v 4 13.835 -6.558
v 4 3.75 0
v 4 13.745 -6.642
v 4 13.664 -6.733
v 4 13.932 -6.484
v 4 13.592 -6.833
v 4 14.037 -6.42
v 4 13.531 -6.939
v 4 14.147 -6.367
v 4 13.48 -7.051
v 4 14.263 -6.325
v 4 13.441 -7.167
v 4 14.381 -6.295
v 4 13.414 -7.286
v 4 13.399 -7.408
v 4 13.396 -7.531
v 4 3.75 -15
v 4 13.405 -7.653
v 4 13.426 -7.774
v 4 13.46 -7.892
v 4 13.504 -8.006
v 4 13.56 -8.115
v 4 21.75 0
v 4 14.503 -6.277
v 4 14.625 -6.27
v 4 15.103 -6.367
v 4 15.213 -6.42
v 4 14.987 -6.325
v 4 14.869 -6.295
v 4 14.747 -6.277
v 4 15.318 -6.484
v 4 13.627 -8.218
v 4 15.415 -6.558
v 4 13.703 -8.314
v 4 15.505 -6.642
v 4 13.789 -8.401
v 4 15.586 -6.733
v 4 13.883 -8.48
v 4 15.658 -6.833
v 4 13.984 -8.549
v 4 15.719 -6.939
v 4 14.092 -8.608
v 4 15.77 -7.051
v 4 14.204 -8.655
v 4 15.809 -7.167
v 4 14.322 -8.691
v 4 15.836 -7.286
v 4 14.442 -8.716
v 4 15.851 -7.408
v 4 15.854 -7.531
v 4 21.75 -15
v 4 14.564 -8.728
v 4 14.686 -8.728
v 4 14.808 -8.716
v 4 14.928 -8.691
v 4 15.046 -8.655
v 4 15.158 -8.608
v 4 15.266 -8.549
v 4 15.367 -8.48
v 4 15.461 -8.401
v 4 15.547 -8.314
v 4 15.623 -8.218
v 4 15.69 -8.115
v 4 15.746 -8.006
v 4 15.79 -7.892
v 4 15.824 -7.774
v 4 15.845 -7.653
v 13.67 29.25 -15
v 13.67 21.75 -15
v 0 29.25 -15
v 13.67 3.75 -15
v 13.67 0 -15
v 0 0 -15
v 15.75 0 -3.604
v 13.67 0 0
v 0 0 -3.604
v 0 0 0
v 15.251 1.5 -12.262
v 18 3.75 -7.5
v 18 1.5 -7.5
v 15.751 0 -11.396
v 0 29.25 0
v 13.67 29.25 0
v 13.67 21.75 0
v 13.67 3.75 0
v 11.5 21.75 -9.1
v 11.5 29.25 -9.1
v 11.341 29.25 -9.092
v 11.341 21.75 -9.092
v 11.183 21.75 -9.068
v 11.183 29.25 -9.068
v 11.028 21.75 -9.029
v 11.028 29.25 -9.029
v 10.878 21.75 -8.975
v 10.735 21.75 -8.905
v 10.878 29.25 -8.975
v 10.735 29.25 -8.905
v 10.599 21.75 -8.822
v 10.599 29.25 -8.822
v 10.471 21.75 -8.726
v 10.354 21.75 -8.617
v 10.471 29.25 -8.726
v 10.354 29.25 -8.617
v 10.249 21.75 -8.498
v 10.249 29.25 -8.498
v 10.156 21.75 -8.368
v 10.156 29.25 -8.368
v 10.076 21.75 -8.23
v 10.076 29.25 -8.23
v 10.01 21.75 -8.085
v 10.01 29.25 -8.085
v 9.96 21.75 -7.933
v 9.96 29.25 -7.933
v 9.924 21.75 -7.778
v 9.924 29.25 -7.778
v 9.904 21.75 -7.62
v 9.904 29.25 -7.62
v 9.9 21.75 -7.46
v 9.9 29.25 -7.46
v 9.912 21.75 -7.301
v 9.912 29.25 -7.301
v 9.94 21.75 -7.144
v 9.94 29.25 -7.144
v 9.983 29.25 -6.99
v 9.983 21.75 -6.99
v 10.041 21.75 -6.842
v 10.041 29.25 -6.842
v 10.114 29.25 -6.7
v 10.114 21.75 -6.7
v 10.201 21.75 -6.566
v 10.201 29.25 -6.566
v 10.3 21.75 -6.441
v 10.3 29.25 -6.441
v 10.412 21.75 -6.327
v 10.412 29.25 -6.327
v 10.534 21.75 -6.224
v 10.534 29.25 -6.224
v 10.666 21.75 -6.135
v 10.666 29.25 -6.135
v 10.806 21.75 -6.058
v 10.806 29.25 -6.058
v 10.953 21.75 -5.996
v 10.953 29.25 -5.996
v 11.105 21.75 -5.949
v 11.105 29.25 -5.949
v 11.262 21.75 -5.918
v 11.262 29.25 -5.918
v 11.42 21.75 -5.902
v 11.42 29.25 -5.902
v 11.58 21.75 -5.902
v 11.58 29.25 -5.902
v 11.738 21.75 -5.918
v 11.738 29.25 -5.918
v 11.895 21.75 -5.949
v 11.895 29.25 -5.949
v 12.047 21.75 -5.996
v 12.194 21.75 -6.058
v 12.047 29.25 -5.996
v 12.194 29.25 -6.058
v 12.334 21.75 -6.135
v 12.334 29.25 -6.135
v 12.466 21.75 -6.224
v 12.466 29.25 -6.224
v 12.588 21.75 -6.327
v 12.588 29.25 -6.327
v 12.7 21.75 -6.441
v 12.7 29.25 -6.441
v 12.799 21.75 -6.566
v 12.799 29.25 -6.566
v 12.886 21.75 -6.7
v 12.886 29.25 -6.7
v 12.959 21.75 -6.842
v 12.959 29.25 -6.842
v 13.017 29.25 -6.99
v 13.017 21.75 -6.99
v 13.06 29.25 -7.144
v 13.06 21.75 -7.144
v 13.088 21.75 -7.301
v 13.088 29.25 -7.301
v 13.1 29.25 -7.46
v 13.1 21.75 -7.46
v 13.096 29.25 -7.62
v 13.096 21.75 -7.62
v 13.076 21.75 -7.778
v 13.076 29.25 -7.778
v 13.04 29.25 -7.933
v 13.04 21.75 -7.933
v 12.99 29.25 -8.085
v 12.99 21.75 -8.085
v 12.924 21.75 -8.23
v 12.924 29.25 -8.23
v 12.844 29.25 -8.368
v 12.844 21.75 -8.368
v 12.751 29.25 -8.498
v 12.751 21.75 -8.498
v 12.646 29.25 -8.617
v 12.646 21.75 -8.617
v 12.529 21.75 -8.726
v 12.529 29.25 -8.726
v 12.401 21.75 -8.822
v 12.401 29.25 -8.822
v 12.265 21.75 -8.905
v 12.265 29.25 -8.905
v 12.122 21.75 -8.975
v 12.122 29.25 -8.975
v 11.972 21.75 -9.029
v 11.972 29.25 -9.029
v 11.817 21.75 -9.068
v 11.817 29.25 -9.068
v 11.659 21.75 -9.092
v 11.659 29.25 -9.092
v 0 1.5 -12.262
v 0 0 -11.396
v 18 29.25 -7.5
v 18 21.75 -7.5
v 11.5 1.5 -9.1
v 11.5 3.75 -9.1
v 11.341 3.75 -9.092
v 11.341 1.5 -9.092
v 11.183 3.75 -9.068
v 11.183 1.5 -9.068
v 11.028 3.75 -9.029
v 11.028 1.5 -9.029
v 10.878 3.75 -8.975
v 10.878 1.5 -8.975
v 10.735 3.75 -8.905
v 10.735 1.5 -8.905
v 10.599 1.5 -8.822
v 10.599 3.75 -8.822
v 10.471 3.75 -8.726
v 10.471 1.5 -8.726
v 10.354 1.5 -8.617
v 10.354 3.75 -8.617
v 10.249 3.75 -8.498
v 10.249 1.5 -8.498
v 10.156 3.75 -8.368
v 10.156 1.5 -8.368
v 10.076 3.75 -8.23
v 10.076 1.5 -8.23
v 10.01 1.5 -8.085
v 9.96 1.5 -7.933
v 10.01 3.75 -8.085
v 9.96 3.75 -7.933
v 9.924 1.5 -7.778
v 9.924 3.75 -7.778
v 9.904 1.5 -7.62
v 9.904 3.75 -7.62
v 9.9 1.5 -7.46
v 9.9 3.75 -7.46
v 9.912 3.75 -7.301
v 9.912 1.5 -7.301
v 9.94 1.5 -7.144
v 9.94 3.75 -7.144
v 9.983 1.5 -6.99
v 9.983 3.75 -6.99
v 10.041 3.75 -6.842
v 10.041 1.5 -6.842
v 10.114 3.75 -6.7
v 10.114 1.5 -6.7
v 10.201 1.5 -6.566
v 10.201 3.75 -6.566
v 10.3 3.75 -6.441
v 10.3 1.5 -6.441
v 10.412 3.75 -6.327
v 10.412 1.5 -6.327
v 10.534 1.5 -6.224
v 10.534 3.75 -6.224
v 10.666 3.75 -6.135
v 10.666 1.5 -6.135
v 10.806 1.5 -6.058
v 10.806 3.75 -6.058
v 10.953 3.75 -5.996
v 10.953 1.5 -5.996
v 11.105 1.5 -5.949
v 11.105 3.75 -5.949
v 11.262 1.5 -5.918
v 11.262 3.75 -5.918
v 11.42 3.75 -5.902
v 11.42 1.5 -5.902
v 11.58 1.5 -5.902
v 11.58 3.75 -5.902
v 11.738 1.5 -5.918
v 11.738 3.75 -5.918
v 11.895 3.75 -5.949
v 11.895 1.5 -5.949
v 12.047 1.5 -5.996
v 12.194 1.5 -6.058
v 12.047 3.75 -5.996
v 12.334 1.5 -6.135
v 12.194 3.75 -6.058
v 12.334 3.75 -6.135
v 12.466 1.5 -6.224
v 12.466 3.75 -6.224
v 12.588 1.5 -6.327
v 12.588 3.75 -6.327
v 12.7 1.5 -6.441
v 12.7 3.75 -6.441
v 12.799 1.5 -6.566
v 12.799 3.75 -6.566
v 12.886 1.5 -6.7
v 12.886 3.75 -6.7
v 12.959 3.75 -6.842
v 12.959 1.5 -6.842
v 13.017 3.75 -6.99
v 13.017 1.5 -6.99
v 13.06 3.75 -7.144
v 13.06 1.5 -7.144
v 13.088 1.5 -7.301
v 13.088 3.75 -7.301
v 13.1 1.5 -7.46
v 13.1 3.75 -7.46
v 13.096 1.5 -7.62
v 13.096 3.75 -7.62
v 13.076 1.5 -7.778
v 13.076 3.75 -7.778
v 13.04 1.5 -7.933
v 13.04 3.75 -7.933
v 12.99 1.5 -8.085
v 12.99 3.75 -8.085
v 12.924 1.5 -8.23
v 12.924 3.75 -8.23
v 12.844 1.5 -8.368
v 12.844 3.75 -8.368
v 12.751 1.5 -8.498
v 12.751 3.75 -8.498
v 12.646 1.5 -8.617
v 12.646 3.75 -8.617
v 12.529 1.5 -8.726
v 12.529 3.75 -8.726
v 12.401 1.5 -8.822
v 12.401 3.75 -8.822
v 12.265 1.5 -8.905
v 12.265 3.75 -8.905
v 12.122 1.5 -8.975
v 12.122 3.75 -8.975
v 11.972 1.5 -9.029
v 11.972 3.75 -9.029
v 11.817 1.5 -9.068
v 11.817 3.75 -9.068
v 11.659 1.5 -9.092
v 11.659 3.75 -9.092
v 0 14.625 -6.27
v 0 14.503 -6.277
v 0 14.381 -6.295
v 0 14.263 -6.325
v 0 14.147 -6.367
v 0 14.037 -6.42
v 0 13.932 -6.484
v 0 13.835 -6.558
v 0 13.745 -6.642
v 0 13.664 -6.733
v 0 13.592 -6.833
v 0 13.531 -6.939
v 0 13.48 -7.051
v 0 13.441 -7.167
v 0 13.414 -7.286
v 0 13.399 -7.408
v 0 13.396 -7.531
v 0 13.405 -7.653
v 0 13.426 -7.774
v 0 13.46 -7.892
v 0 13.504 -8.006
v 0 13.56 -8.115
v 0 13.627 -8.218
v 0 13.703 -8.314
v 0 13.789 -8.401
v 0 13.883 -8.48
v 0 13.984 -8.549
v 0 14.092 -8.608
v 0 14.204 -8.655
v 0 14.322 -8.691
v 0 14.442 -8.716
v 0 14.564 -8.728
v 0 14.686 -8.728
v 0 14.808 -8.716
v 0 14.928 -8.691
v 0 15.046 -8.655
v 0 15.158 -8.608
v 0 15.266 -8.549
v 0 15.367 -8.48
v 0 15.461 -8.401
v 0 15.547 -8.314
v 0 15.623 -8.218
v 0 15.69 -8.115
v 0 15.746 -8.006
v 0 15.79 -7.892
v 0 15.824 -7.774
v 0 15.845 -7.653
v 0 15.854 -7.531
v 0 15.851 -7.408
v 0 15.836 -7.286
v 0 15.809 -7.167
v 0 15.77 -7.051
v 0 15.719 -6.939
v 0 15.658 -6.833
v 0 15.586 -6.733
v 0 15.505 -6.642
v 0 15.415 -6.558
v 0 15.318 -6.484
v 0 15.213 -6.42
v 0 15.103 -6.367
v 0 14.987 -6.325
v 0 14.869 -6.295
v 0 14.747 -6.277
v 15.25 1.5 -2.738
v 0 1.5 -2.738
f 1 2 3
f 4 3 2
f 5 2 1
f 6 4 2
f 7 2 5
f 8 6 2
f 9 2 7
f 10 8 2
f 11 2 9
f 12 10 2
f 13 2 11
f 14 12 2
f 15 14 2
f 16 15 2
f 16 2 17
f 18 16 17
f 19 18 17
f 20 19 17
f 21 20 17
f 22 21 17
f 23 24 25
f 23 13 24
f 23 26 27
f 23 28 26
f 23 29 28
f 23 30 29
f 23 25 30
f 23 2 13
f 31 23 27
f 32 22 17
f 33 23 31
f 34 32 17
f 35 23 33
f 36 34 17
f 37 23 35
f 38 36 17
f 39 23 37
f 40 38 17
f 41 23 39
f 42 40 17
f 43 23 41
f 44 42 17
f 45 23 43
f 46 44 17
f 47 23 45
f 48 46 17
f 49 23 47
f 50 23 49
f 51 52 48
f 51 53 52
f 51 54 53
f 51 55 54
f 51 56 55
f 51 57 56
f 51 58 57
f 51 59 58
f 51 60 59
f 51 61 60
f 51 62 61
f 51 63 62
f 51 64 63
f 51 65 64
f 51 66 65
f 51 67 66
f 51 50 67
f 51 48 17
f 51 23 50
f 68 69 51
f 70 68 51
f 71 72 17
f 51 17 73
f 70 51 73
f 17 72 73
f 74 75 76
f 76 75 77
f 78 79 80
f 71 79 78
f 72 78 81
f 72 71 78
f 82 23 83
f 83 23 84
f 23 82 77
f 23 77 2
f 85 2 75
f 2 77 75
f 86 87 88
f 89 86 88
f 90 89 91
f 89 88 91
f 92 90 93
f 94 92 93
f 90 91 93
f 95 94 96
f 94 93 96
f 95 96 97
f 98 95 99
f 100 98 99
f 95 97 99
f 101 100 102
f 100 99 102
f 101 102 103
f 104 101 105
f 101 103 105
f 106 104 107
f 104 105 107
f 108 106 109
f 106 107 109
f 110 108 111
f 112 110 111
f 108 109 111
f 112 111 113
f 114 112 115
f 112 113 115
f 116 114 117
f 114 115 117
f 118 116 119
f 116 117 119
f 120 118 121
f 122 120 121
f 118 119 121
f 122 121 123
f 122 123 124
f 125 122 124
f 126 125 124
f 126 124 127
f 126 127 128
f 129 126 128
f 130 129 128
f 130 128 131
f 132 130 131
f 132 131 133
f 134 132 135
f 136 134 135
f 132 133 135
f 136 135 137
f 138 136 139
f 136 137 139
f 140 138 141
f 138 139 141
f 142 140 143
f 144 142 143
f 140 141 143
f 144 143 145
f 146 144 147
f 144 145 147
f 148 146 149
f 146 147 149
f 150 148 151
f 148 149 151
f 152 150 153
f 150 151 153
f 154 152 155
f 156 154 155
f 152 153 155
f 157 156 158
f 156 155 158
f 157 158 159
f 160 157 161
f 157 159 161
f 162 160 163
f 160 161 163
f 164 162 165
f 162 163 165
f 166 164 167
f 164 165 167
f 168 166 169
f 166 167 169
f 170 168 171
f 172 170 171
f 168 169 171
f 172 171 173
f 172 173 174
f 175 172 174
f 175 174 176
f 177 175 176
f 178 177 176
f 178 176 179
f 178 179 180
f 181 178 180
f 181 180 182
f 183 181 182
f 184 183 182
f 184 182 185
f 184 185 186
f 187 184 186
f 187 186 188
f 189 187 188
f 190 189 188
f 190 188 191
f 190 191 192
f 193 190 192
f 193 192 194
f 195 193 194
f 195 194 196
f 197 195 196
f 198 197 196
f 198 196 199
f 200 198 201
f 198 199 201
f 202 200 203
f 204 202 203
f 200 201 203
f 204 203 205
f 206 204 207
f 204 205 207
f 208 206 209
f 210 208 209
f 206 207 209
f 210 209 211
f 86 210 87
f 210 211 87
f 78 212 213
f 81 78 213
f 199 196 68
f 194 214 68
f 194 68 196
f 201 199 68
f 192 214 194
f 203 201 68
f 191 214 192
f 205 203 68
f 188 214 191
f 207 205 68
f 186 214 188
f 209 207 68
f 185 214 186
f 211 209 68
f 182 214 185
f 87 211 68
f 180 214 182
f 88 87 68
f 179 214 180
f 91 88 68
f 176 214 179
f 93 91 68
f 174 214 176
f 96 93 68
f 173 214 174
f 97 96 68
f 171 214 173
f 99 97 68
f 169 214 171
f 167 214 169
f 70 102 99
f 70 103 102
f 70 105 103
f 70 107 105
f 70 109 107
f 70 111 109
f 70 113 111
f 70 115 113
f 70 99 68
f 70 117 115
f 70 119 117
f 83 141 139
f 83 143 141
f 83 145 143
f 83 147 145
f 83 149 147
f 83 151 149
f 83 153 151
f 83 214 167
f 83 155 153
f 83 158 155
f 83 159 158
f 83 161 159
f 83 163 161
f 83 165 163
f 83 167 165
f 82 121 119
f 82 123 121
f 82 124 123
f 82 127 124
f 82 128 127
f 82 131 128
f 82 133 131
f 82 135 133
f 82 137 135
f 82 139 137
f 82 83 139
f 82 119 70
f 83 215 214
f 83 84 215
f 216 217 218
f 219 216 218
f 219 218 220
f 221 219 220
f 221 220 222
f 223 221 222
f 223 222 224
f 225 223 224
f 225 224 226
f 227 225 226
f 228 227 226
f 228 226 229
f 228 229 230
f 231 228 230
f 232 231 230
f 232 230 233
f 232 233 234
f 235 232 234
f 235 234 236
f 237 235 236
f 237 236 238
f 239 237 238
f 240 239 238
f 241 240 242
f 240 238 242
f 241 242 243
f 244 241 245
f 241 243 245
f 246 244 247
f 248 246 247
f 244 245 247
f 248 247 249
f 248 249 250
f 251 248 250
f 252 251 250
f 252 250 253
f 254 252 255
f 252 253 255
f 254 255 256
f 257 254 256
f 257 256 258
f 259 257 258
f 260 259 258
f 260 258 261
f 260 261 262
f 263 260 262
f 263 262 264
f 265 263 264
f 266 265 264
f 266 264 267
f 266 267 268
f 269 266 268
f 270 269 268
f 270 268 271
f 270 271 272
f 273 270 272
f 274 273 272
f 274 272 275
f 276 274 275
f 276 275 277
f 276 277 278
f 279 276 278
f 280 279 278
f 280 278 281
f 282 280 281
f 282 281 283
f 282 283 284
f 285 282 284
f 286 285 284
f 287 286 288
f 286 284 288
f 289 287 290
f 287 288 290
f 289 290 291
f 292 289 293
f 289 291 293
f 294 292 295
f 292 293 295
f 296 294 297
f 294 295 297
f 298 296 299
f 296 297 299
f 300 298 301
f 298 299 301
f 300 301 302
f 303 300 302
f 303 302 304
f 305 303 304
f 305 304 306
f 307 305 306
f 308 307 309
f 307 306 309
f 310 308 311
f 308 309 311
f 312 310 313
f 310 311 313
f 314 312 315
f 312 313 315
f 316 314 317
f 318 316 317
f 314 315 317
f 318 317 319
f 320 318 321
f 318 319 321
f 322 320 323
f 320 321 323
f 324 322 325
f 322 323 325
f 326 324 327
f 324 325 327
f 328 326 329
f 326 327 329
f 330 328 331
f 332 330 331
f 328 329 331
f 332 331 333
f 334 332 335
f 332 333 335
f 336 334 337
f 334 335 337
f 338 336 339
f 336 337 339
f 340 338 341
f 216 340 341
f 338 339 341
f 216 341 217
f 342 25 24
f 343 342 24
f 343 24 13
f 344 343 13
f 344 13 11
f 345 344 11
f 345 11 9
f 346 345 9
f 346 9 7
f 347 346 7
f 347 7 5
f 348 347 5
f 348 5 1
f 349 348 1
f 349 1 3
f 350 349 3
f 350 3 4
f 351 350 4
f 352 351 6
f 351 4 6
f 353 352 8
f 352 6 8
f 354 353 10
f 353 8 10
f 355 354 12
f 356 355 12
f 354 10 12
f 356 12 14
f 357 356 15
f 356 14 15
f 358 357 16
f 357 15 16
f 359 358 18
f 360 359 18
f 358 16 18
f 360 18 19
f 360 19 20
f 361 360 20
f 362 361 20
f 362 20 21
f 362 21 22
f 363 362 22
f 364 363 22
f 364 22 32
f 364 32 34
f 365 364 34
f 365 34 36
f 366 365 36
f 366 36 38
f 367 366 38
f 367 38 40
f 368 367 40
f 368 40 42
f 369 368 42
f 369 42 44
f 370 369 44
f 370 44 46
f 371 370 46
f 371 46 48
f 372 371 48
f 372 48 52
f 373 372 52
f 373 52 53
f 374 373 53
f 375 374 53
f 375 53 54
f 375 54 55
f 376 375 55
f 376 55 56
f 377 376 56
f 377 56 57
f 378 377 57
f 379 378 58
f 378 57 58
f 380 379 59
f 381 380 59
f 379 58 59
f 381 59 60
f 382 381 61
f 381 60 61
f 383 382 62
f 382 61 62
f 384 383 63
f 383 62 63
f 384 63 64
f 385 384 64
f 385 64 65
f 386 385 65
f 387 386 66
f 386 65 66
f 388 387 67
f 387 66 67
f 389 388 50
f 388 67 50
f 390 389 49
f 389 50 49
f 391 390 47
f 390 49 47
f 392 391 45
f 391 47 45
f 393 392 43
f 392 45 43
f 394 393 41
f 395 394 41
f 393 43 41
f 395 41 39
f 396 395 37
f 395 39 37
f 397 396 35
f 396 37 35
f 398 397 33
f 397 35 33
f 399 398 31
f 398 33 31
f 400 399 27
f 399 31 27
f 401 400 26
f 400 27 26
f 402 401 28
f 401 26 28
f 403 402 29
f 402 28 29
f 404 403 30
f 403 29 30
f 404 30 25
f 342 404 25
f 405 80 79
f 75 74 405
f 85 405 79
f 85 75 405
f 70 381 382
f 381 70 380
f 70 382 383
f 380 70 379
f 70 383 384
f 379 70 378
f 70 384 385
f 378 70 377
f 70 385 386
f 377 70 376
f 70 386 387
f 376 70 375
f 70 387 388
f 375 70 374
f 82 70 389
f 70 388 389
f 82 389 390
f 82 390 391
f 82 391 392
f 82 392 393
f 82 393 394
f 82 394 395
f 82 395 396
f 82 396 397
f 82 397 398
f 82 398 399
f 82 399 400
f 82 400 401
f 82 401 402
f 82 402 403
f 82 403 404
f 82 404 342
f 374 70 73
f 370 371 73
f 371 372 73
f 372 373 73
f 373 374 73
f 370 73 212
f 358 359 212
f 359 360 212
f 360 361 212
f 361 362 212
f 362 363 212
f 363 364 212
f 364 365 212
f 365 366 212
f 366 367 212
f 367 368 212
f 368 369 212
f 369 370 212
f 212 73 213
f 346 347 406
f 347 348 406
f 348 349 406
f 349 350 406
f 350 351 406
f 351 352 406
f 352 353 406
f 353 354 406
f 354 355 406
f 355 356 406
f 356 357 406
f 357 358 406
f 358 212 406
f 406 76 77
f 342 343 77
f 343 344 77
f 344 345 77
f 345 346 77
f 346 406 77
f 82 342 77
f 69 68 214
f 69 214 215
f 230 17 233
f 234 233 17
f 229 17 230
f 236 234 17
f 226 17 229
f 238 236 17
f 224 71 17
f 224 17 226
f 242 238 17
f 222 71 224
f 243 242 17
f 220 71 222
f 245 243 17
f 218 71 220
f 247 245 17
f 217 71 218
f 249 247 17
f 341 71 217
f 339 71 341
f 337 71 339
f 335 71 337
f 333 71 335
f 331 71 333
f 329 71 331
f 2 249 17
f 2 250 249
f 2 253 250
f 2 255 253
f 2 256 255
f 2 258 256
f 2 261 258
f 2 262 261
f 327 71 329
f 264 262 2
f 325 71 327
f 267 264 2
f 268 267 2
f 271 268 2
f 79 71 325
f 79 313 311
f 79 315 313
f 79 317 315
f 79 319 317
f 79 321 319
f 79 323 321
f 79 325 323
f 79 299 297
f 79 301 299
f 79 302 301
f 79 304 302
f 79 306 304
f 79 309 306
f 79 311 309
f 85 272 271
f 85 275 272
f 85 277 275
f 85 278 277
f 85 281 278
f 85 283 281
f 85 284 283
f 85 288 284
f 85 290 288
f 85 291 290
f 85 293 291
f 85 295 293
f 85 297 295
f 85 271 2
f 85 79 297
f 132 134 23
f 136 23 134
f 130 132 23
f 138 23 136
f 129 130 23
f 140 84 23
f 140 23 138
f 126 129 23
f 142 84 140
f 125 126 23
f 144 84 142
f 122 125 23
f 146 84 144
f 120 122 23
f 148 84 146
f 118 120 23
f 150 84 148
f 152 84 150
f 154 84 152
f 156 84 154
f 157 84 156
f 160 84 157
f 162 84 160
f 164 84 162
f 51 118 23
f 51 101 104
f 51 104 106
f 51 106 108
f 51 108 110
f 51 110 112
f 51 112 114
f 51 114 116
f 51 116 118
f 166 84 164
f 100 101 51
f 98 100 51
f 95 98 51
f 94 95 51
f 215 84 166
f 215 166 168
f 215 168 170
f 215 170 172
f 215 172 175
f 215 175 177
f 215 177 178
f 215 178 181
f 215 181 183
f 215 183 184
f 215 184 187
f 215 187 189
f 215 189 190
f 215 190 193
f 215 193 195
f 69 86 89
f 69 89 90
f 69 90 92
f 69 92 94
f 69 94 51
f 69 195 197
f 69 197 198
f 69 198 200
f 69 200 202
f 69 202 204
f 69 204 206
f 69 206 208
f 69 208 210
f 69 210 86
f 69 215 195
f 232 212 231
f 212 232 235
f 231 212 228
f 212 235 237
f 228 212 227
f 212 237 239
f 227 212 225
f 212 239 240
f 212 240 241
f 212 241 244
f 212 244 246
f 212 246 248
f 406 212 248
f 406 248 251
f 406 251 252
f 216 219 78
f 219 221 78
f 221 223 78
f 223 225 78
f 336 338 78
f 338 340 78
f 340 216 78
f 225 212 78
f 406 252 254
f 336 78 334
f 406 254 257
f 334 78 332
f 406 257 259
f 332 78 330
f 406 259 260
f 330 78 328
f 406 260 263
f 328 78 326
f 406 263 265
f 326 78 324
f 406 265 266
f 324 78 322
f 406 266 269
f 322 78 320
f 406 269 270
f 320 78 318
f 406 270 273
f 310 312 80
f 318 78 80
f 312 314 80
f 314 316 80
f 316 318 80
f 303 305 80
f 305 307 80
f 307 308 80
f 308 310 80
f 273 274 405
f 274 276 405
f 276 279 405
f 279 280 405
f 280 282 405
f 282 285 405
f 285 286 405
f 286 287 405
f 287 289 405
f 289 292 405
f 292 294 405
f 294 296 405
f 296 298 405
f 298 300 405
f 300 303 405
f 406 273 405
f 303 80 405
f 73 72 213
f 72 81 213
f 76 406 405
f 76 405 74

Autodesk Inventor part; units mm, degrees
ref_plane "YZ Plane" through (0, 0, 0) normal (1, 0, 0) x (0, 1, 0)
ref_plane "XZ Plane" through (0, 0, 0) normal (0, 1, 0) x (-1, 0, 0)
ref_plane "XY Plane" through (0, 0, 0) normal (0, 0, 1) x (1, 0, 0)
sketch "Original Profile" plane through (0, 0, 0) normal (0, 1, 0) x (-1, 0, 0)
  line L0 (0, 0) -> (-18, 0)
  line L1 (-18, 0) -> (-18, -15)
  line L2 (-18, -15) -> (0, -15)
  line L3 (0, -15) -> (0, 0)
  line L4 (0, -7.5) -> (-18, -7.5)
  circle A0 centre (-11.5, -7.5) radius 1.5
  circle A1 centre (-11.5, -7.5) radius 6.5
  line L5 (-5, -15) -> (-5, 0)
  line L6 (0, -9.0875) -> (-18, -9.0875)
  line L7 (-18, -9.0875) -> (-18, -5.9125)
  line L8 (-18, -5.9125) -> (0, -5.9125)
  line L9 (0, -5.9125) -> (0, -9.0875)
  point P0 (0, -5.9125)
  point P1 (-18, -9.0875)
  dimension "d8" = 3
  dimension "d9" = 13
  dimension "d10" = 15
  dimension "d11" = 11.5
  dimension "d12" = 6.5
  dimension "d15" = 5
  dimension "d32" = 3.175
  dimension "d33" = 3.175
extrude "Stock" add sketch "Original Profile" along normal blind 29.25
sketch "Sketch4" plane through (18, 0, 0) normal (1, 0, 0) x (0, 0, -1)
  line L0 (15, 0) -> (15, 29.25) projected
  line L1 (0, 21.75) -> (15, 21.75)
  line L2 (15, 21.75) -> (15, 3.75)
  line L3 (15, 3.75) -> (0, 3.75)
  line L4 (0, 3.75) -> (0, 21.75)
  line L5 (0, 0) -> (0, 29.25) projected
  line L6 (0, 0) -> (15, 0) projected
  line L7 (15, 29.25) -> (0, 29.25) projected
  line L8 (7.5, 29.25) -> (7.5, 0) construction
  line L9 (15, 0) -> (0, 0) projected
  line L10 (2.7375, 0) -> (12.2625, 0)
  line L11 (12.2625, 0) -> (12.2625, 1.5)
  line L12 (12.2625, 1.5) -> (2.7375, 1.5)
  line L13 (2.7375, 1.5) -> (2.7375, 0)
  line L14 (2.7375, 1.5) -> (3.6035, 0)
  line L15 (2.7375, 1.5) -> (4.4696, 1.5) construction
  line L16 (12.2625, 1.5) -> (11.3965, 0)
  line L17 (12.2625, 1.5) -> (13.9946, 1.5) construction
  dimension "d40" = 3.75
  dimension "d41" = 18
  dimension "d44" = 9.525
  dimension "d45" = 4.7625
  dimension "d46" = 1.5
  dimension "d47" = 60
  dimension "d48" = 120
extrude "Cut Slot" cut sketch "Sketch4" against normal blind 14 contours L3 L4 L1 L0
extrude "Extrusion7" cut sketch "Sketch4" against normal through all contours L6 L14 L12 L16
hole "Hole1" at (11.5, 0, -7.5) direction (0, 1, 0) diameter 3.2004 end through all clearance for "Socket Head Cap Screw" size "M3" standard "Ansi Metric M Profile"
sketch "Sketch5" plane through (0, 0, 0) normal (-1, 0, 0) x (0, 0, 1)
  circle A0 centre (-7.5, 14.625) radius 1.5
  line L0 (-15, 29.25) -> (0, 29.25) projected
  line L1 (-15, 0) -> (-11.3965, 0) projected
  line L2 (-15, 0) -> (-15, 29.25) projected
  point P0 (0, 0)
  dimension "d51" = 3
  dimension "d52" = 14.625
  dimension "d53" = 29.25
  dimension "d54" = 7.5
hole "Hole2" at (0, 14.625, -7.5) direction (1, 0, 0) diameter 2.459 end through all thread size "M3x0.5" class "6H" standard "ANSI Metric M Profile"
chamfer "Chamfer1" distance 7.5 angle 30 1 edges at (18, 25.5, 0) measured on face at (18, 24.25, -10)
chamfer "Chamfer2" distance 7.5 angle 30 1 edges at (18, 1.875, 0) measured on face at (18, 3, -5.9125)
chamfer "Chamfer3" distance 7.5 angle 30 1 edges at (18, 25.5, -15) measured on face at (18, 24.25, -10)
chamfer "Chamfer4" distance 7.5 angle 30 1 edges at (18, 1.875, -15) measured on face at (18, 3, -11.5875)
equation "\"d12\" = 0.5 * d9"
equation "\"d33\" = d32"
equation "\"d45\" = 0.5 * d44"
equation "\"d52\" = 0.5 * d53"
properties part number "Bearing Sled Single" material "Aluminum 6061"
